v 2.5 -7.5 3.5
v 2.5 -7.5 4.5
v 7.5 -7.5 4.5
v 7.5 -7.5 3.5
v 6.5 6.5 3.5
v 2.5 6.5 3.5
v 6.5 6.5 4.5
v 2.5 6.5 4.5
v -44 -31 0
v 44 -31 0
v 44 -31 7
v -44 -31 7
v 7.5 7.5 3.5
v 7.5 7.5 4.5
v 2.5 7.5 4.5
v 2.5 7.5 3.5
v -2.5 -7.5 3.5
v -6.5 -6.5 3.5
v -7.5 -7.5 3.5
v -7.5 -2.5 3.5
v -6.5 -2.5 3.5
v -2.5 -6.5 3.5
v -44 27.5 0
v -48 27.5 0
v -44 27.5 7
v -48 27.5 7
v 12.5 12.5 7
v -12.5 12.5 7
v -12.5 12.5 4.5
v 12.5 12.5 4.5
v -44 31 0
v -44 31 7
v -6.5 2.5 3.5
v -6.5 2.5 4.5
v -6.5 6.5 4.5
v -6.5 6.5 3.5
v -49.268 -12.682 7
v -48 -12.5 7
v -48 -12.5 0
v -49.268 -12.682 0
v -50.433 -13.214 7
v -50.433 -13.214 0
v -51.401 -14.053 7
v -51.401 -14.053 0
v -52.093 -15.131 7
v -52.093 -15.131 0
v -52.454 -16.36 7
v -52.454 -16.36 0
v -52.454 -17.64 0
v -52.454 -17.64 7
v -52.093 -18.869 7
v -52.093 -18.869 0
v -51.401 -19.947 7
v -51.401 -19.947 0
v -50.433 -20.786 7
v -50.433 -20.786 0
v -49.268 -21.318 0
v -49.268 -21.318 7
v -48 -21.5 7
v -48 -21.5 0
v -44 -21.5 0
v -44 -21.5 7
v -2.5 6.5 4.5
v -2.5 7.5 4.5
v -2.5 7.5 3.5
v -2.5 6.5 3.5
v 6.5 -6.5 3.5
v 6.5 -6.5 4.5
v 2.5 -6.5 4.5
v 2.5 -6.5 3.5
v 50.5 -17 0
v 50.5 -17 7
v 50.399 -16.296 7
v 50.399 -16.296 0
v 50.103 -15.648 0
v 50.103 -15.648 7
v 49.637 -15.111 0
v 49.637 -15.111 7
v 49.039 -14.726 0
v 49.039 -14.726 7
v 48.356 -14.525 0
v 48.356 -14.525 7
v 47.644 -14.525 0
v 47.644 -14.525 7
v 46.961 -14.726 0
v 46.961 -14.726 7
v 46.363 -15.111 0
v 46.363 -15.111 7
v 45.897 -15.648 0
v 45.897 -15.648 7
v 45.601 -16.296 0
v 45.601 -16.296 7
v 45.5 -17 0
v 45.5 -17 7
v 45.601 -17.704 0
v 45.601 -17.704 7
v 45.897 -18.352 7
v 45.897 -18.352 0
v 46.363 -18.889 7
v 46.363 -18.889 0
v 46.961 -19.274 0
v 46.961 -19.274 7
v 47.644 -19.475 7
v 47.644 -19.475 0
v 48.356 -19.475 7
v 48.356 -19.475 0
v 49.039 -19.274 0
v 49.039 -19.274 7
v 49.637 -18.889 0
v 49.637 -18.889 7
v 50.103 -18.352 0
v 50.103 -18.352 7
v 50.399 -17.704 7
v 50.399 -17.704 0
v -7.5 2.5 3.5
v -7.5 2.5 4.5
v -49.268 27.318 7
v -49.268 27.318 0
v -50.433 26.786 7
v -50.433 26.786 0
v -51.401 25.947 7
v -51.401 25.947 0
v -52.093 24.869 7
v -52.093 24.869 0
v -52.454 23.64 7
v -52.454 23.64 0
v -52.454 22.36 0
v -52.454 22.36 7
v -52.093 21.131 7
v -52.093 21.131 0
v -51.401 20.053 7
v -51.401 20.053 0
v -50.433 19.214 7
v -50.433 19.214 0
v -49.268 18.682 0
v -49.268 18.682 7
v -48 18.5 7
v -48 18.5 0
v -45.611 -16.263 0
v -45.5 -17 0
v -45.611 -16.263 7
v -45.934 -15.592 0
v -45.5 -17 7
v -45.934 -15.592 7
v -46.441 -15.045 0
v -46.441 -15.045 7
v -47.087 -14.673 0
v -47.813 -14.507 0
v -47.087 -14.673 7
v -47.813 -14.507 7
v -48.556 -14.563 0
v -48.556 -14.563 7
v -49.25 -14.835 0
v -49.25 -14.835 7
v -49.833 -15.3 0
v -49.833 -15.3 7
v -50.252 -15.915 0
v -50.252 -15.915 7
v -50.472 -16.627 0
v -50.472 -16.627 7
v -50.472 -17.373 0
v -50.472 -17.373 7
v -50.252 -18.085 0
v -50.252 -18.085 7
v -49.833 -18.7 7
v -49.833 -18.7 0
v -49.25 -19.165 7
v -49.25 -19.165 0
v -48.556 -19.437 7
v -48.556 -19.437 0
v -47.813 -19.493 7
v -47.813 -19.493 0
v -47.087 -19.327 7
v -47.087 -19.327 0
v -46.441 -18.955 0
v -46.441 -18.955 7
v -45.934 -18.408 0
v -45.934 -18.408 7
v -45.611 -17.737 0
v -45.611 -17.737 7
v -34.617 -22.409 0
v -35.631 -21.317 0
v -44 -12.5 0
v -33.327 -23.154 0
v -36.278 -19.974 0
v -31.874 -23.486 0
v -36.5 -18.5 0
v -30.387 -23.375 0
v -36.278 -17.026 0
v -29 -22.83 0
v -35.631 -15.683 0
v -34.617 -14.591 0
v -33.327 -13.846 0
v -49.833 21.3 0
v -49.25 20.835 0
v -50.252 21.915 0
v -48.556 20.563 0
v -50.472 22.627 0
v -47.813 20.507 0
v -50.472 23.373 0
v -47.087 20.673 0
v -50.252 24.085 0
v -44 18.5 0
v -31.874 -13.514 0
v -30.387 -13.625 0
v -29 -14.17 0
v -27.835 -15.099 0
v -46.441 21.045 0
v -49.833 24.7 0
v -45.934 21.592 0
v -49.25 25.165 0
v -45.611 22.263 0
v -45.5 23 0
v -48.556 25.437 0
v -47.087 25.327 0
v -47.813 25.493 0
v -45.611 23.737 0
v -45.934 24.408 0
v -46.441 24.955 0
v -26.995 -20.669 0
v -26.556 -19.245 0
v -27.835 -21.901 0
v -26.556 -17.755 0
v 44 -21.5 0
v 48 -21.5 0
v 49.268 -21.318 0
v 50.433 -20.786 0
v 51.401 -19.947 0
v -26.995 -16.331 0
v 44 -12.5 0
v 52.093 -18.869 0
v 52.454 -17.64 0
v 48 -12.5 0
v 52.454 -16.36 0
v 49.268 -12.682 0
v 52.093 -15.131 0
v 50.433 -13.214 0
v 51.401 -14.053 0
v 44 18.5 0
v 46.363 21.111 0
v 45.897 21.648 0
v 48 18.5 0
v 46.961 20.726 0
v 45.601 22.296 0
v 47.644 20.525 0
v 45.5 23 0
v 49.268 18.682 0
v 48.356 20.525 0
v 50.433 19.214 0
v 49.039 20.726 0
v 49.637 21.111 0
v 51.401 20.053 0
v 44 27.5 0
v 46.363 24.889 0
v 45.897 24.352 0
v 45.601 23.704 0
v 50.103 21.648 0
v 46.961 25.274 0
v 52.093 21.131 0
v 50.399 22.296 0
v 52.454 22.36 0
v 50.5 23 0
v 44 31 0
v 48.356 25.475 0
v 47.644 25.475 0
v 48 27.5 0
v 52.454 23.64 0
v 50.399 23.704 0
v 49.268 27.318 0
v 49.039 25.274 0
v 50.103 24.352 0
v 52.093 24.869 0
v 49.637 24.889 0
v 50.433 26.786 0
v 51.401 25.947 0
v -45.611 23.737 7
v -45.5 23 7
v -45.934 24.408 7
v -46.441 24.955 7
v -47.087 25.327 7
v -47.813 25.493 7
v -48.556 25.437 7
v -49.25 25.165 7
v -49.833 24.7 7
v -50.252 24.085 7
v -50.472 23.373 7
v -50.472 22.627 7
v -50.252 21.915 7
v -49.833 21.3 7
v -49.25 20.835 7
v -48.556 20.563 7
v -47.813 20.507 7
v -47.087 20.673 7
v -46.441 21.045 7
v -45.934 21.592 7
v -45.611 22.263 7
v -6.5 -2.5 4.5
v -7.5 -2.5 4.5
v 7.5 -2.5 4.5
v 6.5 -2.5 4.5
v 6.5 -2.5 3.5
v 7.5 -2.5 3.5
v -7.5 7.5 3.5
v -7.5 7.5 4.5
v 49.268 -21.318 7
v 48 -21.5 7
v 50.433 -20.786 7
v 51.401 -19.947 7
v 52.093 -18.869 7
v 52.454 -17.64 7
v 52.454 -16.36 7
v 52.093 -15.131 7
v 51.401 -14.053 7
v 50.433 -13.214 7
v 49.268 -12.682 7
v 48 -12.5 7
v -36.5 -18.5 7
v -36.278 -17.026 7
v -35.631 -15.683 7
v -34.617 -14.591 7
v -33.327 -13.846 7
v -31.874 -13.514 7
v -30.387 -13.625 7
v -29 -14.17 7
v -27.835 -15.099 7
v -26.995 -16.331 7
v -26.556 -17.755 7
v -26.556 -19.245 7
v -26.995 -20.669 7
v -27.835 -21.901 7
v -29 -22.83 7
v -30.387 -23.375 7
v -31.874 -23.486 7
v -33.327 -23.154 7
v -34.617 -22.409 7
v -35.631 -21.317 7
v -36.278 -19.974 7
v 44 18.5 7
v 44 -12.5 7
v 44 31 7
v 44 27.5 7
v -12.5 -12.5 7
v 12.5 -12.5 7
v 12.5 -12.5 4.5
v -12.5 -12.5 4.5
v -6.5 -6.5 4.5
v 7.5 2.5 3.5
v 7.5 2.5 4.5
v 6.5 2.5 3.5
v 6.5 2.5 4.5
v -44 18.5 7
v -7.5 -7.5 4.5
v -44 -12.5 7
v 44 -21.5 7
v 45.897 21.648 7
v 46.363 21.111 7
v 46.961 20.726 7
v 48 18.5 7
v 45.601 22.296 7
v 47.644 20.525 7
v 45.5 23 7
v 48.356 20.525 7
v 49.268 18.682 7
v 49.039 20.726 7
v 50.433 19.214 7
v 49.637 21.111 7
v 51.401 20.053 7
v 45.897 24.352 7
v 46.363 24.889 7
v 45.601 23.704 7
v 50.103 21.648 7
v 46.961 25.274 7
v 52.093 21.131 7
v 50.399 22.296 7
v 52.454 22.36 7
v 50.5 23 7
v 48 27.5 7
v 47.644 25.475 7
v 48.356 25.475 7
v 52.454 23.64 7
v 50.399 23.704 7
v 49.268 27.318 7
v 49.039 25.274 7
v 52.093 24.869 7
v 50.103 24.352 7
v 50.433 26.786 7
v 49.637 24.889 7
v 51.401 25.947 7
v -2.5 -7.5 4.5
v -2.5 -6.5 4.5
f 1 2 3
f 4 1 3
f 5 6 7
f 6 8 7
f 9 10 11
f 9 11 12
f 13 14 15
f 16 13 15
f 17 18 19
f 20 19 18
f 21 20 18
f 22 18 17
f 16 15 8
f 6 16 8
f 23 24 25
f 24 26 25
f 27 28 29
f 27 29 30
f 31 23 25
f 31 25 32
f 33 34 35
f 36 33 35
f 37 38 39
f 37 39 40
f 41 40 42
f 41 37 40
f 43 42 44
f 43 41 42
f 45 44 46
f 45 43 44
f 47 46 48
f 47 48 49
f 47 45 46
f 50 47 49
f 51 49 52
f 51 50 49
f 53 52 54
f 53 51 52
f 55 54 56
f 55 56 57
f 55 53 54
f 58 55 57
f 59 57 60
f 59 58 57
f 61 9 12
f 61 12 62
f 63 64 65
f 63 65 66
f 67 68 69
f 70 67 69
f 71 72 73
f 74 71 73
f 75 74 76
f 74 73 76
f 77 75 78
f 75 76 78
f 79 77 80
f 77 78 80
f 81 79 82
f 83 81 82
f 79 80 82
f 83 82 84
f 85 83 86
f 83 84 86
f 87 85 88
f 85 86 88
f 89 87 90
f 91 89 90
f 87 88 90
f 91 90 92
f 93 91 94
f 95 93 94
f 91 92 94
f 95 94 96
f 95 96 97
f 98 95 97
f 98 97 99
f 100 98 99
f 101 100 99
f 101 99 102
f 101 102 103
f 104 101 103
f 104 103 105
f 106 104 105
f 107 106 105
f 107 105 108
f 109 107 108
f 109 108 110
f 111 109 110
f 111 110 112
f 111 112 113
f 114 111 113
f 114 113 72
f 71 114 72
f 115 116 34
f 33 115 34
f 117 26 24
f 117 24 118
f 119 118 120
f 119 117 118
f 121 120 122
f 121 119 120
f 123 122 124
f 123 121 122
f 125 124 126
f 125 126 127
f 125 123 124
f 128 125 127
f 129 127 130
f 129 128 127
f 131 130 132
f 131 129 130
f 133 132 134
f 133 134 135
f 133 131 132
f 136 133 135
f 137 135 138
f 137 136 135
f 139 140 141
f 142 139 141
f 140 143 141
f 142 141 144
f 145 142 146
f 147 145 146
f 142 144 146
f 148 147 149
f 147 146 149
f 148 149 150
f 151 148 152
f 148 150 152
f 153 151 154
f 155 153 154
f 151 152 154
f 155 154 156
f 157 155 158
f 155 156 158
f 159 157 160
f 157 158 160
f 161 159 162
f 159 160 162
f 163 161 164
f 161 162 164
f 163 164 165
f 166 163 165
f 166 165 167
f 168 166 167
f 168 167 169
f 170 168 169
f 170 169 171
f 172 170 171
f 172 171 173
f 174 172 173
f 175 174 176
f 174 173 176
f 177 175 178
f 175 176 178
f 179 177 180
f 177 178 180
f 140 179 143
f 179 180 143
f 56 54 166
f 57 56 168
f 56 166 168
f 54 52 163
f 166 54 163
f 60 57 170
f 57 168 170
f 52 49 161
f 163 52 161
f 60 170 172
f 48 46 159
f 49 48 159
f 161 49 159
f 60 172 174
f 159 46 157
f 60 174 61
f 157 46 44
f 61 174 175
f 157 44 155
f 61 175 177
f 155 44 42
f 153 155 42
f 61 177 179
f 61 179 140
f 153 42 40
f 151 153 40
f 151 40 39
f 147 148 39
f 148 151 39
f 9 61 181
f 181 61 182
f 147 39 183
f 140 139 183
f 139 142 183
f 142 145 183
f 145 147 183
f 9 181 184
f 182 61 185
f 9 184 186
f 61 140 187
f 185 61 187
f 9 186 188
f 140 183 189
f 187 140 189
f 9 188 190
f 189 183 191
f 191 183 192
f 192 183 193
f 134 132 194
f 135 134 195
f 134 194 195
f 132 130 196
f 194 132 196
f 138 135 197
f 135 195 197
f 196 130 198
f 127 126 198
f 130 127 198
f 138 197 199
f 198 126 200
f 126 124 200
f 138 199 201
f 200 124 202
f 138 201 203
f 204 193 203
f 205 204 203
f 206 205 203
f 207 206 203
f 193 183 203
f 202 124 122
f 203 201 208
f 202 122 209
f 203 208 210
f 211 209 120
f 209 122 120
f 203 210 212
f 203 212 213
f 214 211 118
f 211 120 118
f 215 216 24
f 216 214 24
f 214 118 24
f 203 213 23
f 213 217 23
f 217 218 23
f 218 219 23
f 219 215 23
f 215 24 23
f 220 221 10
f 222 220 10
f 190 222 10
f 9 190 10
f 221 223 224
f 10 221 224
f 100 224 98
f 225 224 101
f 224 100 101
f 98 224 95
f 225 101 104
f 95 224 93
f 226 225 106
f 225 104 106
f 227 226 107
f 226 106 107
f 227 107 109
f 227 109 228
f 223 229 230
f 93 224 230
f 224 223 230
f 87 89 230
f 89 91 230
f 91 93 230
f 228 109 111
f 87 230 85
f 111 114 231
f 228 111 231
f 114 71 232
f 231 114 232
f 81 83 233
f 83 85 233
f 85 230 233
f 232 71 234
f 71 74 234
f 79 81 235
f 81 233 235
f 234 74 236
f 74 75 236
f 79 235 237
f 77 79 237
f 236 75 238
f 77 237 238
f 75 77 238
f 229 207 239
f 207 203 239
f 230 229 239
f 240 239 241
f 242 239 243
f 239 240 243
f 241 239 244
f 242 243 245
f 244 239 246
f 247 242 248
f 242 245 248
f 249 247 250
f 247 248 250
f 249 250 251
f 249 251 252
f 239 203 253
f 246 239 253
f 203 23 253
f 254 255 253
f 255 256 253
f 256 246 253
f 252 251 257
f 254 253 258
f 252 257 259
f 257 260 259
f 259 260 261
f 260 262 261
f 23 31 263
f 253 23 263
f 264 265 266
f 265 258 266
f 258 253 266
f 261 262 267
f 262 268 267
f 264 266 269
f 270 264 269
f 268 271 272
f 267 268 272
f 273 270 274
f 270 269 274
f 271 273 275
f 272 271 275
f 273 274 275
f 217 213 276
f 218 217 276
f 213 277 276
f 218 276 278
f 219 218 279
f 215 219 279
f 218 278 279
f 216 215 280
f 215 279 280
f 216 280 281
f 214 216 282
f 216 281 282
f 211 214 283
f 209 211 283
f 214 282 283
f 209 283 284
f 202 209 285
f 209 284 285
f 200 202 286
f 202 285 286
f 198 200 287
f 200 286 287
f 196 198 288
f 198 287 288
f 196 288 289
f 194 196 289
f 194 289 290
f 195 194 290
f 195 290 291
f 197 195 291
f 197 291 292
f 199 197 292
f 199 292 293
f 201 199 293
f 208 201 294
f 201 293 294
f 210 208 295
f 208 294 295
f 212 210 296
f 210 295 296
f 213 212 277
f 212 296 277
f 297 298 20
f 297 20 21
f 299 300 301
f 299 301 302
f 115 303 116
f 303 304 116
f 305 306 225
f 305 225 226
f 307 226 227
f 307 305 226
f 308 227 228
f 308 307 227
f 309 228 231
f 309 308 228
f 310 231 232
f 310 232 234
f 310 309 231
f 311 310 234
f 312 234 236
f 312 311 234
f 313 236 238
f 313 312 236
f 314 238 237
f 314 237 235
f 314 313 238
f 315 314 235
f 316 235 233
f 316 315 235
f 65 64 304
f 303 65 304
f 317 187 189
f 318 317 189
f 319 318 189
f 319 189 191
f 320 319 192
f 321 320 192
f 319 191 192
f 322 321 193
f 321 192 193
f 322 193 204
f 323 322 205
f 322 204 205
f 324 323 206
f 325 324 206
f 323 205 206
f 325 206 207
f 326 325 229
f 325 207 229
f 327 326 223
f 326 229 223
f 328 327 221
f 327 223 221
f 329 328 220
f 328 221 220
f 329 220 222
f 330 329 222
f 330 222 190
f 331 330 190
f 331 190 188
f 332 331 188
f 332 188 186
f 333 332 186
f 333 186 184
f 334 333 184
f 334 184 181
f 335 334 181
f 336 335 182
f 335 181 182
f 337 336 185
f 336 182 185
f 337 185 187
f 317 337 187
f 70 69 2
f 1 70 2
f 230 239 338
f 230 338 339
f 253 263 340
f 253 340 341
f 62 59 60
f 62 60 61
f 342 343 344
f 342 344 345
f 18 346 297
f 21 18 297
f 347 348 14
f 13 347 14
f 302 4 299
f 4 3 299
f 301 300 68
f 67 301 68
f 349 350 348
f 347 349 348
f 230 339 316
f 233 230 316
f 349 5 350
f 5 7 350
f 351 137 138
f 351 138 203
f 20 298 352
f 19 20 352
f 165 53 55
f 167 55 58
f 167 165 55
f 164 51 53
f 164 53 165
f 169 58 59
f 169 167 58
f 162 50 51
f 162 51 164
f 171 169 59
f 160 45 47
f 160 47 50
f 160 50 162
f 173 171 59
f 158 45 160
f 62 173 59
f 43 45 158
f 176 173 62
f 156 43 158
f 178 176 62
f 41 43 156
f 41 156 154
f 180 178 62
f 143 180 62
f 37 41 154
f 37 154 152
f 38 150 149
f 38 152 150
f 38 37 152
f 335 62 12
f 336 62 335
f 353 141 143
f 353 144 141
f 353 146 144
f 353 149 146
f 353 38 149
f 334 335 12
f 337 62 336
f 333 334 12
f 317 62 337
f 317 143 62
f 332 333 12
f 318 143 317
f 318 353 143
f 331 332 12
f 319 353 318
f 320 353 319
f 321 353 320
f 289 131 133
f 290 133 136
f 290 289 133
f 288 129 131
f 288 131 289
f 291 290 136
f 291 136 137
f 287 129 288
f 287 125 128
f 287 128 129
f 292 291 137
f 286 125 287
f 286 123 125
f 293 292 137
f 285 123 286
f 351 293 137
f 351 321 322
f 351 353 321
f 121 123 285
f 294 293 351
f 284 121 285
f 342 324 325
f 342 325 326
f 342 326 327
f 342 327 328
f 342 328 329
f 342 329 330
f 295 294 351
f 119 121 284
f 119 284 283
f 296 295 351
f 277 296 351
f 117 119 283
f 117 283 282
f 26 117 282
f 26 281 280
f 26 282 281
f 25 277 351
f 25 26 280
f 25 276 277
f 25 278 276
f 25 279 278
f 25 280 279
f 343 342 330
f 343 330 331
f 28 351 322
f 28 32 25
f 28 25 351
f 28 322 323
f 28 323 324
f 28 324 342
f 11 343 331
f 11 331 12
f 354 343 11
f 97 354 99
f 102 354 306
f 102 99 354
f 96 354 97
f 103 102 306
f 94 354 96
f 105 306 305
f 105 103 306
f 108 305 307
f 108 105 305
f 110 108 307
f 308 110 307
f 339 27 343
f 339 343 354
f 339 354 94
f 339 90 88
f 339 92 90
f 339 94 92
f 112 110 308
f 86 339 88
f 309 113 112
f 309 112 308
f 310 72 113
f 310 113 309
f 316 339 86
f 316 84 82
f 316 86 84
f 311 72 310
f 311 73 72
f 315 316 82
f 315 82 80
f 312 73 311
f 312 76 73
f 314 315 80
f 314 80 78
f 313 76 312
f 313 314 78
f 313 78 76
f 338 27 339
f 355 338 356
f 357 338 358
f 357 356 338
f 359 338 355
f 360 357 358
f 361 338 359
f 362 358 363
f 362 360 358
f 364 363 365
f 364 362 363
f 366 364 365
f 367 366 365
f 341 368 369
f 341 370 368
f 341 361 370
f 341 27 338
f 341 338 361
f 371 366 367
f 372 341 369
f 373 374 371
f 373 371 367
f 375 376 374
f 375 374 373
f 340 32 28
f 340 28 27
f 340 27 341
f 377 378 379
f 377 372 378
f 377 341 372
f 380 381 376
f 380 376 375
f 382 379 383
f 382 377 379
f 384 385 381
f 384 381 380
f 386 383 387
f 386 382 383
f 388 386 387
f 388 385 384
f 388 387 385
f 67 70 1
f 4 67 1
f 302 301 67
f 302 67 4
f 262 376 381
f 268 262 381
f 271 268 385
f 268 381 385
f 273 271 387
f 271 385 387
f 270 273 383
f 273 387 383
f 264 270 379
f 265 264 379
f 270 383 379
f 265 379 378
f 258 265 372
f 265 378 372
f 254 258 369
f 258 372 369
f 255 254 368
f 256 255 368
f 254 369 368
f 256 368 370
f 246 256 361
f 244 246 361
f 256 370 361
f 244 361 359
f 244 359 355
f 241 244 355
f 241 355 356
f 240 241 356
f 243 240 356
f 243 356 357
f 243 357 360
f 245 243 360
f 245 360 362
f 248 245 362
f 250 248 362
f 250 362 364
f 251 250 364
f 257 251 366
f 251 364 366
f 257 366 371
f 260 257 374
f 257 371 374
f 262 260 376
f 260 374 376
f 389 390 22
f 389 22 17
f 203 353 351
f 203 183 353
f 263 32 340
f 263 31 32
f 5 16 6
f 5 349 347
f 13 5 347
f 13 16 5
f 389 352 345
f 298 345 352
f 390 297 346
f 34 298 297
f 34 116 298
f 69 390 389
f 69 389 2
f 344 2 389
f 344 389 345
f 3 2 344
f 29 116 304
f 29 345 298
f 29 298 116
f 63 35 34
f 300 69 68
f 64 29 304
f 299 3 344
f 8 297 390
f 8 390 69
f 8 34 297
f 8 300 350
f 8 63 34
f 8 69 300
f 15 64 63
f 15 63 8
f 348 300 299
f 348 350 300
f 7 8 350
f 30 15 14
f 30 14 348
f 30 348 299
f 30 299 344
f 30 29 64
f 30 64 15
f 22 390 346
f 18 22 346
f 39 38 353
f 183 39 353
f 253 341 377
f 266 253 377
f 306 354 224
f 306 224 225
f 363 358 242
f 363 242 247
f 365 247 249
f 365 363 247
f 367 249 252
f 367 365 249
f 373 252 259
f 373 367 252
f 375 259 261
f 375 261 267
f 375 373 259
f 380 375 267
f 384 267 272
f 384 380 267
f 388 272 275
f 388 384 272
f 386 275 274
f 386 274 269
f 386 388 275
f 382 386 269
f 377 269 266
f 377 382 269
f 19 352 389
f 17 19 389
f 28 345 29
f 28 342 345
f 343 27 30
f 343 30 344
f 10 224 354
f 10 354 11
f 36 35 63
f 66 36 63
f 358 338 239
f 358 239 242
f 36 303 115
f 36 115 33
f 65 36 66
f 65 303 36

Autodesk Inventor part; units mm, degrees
ref_plane "YZ Plane" through (0, 0, 0) normal (1, 0, 0) x (0, 1, 0)
ref_plane "XZ Plane" through (0, 0, 0) normal (0, 1, 0) x (-1, 0, 0)
ref_plane "XY Plane" through (0, 0, 0) normal (0, 0, 1) x (1, 0, 0)
sketch "Sketch1" plane through (0, 0, 0) normal (0, 0, 1) x (1, 0, 0)
  line L0 (44, -31) -> (-44, -31)
  line L1 (-44, -31) -> (-44, 31)
  line L2 (-44, 31) -> (44, 31)
  line L3 (44, 31) -> (44, -31)
  line L4 (44, -31) -> (-44, 31) construction
  line L5 (-44, -31) -> (44, 31) construction
  point P0 (0, 0)
  dimension "d0" = 88
  dimension "d1" = 62
extrude "Extrusion1" add sketch "Sketch1" along normal blind 7
sketch "Sketch2" plane through (0, 0, 7) normal (0, 0, 1) x (1, 0, 0)
  circle A0 centre (-48, 23) radius 2.5
  line L0 (-48, 23) -> (-44, 23)
  line L1 (-44, 31) -> (-44, -31) projected
  arc A1 (-48, 27.5) -> (-48, 18.5) centre (-48, 23) ccw
  line L2 (44, 31) -> (-44, 31) projected
  line L3 (-44, 29.1847) -> (-44, 31)
  line L4 (-44, 16.8153) -> (-44, 18.5)
  line L5 (0, 54.4598) -> (0, -54.4598) construction
  circle A2 centre (48, 23) radius 2.5
  line L6 (48, 23) -> (44, 23)
  line L7 (44, 31) -> (44, -31)
  arc A3 (48, 18.5) -> (48, 27.5) centre (48, 23) ccw
  line L8 (44, 29.1847) -> (44, 31)
  line L9 (44, 16.8153) -> (44, 18.5)
  circle A4 centre (48, -17) radius 2.5
  line L10 (48, -17) -> (44, -17)
  arc A5 (48, -21.5) -> (48, -12.5) centre (48, -17) ccw
  line L11 (44, -10.8153) -> (44, -9)
  line L12 (44, -23.1847) -> (44, -21.5)
  line L13 (-44, 29.1847) -> (-44, 31)
  line L14 (-44, 16.8153) -> (-44, -9)
  line L15 (-44, -23.1847) -> (-44, -31)
  line L16 (44, 29.1847) -> (44, 31)
  line L17 (44, 16.8153) -> (44, -10.8153)
  line L18 (44, -31) -> (44, 31) projected
  line L19 (44, -23.1847) -> (44, -31)
  line L20 (44, 18.5) -> (48, 18.5)
  line L21 (44, 27.5) -> (48, 27.5)
  line L22 (44, -21.5) -> (48, -21.5)
  line L23 (44, -12.5) -> (48, -12.5)
  line L24 (-48, 27.5) -> (-44, 27.5)
  line L25 (-48, 27.5) -> (-44, 27.5) construction
  line L26 (-48, 18.5) -> (-44, 18.5)
  line L27 (-44, -17) -> (-48, -17)
  circle A6 centre (-48, -17) radius 2.5
  arc A7 (-48, -12.5) -> (-48, -21.5) centre (-48, -17) ccw
  line L28 (-48, -21.5) -> (-44, -21.5)
  line L29 (-48, -12.5) -> (-44, -12.5)
  point P0 (0, 0)
  point P1 (-44, 20.9384)
  point P2 (-44, 25.0616)
  point P3 (-46.6154, 27.2817)
  point P4 (-46.6154, 18.7183)
  point P5 (44, 20.9384)
  point P6 (44, 25.0616)
  point P7 (46.6154, 27.2817)
  point P8 (46.6154, 18.7183)
  point P9 (46.6154, -12.7183)
  point P10 (46.6954, -21.4151)
  point P11 (44, -19.0616)
  point P12 (44, -14.9384)
  point P13 (44, -23.1847)
  dimension "d4" = 5
  dimension "d5" = 4
  dimension "d6" = 2
  dimension "d32" = 8
  dimension "d43" = 4
  dimension "d44" = 5
  dimension "d45" = 2
  dimension "d46" = 40
  dimension "d47" = 0
  dimension "d48" = 5
  dimension "d49" = 2
  dimension "d50" = 40
  dimension "d51" = 4
extrude "Extrusion2" add sketch "Sketch2" against normal blind 7
sketch "Sketch3" plane through (0, 0, 7) normal (0, 0, 1) x (1, 0, 0)
  line L0 (12.5, -12.5) -> (-12.5, -12.5)
  line L1 (-12.5, -12.5) -> (-12.5, 12.5)
  line L2 (-12.5, 12.5) -> (12.5, 12.5)
  line L3 (12.5, 12.5) -> (12.5, -12.5)
  line L4 (12.5, -12.5) -> (-12.5, 12.5) construction
  line L5 (-12.5, -12.5) -> (12.5, 12.5) construction
  point P0 (0, 0)
  dimension "d33" = 25
  dimension "d34" = 25
extrude "Extrusion3" cut sketch "Sketch3" against normal blind 2.5
sketch "Sketch4" plane through (0, 0, 4.5) normal (0, 0, 1) x (1, 0, 0)
  line L0 (-12.5, 12.5) -> (12.5, 12.5) projected
  line L1 (-12.5, -12.5) -> (-12.5, 12.5) projected
  line L2 (12.5, -12.5) -> (-12.5, -12.5) projected
  line L3 (12.5, 12.5) -> (12.5, -12.5) projected
  line L4 (7.5, 7.5) -> (-7.5, 7.5)
  line L5 (-7.5, 7.5) -> (-7.5, -7.5)
  line L6 (-7.5, -7.5) -> (7.5, -7.5)
  line L7 (7.5, -7.5) -> (7.5, 7.5)
  line L8 (-6.5, 6.5) -> (6.5, 6.5)
  line L9 (6.5, 6.5) -> (6.5, -6.5)
  line L10 (6.5, -6.5) -> (-6.5, -6.5)
  line L11 (-6.5, -6.5) -> (-6.5, 6.5)
  line L12 (-9.9797, 2.5) -> (9.6006, 2.5)
  line L13 (-9.9797, -2.5) -> (9.6006, -2.5)
  line L14 (-2.5, 9.6233) -> (-2.5, -10.0692)
  line L15 (2.5, 9.6233) -> (2.5, -9.2277)
  point P0 (0, 0)
  point P1 (-2.5, -7.5)
  point P2 (-2.5, -6.5)
  point P3 (-6.5, -2.5)
  point P4 (-7.5, -2.5)
  point P5 (2.5, -6.5)
  point P6 (2.5, -7.5)
  point P7 (7.5, -2.5)
  point P8 (6.5, -2.5)
  point P9 (2.5, 7.5)
  point P10 (2.5, 6.5)
  point P11 (6.5, 2.5)
  point P12 (7.5, 2.5)
  point P13 (-2.5, 6.5)
  point P14 (-2.5, 7.5)
  point P15 (-7.5, 2.5)
  point P16 (-6.5, 2.5)
  dimension "d35" = 5
  dimension "d36" = 1
  dimension "d37" = 5
  dimension "d38" = 5
  dimension "d39" = 5
  dimension "d40" = 5
extrude "Extrusion4" cut sketch "Sketch4" against normal blind 1 contours L7 L12 L9 L8 L15 L4 | L14 L8 L11 L12 L5 L4 | L7 L6 L15 L10 L9 L13 | L13 L11 L10 L14 L6 L5
sketch "Sketch5" plane through (0, 0, 0) normal (0, 0, -1) x (-1, 0, 0)
  circle A0 centre (31.5, -18.5) radius 5
  line L0 (44, -21.5) -> (44, -31) projected
  line L1 (44, -31) -> (-44, -31) projected
  point P0 (0, 0)
  dimension "d52" = 10
  dimension "d53" = 12.5
  dimension "d54" = 12.5
extrude "Extrusion5" cut sketch "Sketch5" against normal blind 7
properties part number "soporte p2"
